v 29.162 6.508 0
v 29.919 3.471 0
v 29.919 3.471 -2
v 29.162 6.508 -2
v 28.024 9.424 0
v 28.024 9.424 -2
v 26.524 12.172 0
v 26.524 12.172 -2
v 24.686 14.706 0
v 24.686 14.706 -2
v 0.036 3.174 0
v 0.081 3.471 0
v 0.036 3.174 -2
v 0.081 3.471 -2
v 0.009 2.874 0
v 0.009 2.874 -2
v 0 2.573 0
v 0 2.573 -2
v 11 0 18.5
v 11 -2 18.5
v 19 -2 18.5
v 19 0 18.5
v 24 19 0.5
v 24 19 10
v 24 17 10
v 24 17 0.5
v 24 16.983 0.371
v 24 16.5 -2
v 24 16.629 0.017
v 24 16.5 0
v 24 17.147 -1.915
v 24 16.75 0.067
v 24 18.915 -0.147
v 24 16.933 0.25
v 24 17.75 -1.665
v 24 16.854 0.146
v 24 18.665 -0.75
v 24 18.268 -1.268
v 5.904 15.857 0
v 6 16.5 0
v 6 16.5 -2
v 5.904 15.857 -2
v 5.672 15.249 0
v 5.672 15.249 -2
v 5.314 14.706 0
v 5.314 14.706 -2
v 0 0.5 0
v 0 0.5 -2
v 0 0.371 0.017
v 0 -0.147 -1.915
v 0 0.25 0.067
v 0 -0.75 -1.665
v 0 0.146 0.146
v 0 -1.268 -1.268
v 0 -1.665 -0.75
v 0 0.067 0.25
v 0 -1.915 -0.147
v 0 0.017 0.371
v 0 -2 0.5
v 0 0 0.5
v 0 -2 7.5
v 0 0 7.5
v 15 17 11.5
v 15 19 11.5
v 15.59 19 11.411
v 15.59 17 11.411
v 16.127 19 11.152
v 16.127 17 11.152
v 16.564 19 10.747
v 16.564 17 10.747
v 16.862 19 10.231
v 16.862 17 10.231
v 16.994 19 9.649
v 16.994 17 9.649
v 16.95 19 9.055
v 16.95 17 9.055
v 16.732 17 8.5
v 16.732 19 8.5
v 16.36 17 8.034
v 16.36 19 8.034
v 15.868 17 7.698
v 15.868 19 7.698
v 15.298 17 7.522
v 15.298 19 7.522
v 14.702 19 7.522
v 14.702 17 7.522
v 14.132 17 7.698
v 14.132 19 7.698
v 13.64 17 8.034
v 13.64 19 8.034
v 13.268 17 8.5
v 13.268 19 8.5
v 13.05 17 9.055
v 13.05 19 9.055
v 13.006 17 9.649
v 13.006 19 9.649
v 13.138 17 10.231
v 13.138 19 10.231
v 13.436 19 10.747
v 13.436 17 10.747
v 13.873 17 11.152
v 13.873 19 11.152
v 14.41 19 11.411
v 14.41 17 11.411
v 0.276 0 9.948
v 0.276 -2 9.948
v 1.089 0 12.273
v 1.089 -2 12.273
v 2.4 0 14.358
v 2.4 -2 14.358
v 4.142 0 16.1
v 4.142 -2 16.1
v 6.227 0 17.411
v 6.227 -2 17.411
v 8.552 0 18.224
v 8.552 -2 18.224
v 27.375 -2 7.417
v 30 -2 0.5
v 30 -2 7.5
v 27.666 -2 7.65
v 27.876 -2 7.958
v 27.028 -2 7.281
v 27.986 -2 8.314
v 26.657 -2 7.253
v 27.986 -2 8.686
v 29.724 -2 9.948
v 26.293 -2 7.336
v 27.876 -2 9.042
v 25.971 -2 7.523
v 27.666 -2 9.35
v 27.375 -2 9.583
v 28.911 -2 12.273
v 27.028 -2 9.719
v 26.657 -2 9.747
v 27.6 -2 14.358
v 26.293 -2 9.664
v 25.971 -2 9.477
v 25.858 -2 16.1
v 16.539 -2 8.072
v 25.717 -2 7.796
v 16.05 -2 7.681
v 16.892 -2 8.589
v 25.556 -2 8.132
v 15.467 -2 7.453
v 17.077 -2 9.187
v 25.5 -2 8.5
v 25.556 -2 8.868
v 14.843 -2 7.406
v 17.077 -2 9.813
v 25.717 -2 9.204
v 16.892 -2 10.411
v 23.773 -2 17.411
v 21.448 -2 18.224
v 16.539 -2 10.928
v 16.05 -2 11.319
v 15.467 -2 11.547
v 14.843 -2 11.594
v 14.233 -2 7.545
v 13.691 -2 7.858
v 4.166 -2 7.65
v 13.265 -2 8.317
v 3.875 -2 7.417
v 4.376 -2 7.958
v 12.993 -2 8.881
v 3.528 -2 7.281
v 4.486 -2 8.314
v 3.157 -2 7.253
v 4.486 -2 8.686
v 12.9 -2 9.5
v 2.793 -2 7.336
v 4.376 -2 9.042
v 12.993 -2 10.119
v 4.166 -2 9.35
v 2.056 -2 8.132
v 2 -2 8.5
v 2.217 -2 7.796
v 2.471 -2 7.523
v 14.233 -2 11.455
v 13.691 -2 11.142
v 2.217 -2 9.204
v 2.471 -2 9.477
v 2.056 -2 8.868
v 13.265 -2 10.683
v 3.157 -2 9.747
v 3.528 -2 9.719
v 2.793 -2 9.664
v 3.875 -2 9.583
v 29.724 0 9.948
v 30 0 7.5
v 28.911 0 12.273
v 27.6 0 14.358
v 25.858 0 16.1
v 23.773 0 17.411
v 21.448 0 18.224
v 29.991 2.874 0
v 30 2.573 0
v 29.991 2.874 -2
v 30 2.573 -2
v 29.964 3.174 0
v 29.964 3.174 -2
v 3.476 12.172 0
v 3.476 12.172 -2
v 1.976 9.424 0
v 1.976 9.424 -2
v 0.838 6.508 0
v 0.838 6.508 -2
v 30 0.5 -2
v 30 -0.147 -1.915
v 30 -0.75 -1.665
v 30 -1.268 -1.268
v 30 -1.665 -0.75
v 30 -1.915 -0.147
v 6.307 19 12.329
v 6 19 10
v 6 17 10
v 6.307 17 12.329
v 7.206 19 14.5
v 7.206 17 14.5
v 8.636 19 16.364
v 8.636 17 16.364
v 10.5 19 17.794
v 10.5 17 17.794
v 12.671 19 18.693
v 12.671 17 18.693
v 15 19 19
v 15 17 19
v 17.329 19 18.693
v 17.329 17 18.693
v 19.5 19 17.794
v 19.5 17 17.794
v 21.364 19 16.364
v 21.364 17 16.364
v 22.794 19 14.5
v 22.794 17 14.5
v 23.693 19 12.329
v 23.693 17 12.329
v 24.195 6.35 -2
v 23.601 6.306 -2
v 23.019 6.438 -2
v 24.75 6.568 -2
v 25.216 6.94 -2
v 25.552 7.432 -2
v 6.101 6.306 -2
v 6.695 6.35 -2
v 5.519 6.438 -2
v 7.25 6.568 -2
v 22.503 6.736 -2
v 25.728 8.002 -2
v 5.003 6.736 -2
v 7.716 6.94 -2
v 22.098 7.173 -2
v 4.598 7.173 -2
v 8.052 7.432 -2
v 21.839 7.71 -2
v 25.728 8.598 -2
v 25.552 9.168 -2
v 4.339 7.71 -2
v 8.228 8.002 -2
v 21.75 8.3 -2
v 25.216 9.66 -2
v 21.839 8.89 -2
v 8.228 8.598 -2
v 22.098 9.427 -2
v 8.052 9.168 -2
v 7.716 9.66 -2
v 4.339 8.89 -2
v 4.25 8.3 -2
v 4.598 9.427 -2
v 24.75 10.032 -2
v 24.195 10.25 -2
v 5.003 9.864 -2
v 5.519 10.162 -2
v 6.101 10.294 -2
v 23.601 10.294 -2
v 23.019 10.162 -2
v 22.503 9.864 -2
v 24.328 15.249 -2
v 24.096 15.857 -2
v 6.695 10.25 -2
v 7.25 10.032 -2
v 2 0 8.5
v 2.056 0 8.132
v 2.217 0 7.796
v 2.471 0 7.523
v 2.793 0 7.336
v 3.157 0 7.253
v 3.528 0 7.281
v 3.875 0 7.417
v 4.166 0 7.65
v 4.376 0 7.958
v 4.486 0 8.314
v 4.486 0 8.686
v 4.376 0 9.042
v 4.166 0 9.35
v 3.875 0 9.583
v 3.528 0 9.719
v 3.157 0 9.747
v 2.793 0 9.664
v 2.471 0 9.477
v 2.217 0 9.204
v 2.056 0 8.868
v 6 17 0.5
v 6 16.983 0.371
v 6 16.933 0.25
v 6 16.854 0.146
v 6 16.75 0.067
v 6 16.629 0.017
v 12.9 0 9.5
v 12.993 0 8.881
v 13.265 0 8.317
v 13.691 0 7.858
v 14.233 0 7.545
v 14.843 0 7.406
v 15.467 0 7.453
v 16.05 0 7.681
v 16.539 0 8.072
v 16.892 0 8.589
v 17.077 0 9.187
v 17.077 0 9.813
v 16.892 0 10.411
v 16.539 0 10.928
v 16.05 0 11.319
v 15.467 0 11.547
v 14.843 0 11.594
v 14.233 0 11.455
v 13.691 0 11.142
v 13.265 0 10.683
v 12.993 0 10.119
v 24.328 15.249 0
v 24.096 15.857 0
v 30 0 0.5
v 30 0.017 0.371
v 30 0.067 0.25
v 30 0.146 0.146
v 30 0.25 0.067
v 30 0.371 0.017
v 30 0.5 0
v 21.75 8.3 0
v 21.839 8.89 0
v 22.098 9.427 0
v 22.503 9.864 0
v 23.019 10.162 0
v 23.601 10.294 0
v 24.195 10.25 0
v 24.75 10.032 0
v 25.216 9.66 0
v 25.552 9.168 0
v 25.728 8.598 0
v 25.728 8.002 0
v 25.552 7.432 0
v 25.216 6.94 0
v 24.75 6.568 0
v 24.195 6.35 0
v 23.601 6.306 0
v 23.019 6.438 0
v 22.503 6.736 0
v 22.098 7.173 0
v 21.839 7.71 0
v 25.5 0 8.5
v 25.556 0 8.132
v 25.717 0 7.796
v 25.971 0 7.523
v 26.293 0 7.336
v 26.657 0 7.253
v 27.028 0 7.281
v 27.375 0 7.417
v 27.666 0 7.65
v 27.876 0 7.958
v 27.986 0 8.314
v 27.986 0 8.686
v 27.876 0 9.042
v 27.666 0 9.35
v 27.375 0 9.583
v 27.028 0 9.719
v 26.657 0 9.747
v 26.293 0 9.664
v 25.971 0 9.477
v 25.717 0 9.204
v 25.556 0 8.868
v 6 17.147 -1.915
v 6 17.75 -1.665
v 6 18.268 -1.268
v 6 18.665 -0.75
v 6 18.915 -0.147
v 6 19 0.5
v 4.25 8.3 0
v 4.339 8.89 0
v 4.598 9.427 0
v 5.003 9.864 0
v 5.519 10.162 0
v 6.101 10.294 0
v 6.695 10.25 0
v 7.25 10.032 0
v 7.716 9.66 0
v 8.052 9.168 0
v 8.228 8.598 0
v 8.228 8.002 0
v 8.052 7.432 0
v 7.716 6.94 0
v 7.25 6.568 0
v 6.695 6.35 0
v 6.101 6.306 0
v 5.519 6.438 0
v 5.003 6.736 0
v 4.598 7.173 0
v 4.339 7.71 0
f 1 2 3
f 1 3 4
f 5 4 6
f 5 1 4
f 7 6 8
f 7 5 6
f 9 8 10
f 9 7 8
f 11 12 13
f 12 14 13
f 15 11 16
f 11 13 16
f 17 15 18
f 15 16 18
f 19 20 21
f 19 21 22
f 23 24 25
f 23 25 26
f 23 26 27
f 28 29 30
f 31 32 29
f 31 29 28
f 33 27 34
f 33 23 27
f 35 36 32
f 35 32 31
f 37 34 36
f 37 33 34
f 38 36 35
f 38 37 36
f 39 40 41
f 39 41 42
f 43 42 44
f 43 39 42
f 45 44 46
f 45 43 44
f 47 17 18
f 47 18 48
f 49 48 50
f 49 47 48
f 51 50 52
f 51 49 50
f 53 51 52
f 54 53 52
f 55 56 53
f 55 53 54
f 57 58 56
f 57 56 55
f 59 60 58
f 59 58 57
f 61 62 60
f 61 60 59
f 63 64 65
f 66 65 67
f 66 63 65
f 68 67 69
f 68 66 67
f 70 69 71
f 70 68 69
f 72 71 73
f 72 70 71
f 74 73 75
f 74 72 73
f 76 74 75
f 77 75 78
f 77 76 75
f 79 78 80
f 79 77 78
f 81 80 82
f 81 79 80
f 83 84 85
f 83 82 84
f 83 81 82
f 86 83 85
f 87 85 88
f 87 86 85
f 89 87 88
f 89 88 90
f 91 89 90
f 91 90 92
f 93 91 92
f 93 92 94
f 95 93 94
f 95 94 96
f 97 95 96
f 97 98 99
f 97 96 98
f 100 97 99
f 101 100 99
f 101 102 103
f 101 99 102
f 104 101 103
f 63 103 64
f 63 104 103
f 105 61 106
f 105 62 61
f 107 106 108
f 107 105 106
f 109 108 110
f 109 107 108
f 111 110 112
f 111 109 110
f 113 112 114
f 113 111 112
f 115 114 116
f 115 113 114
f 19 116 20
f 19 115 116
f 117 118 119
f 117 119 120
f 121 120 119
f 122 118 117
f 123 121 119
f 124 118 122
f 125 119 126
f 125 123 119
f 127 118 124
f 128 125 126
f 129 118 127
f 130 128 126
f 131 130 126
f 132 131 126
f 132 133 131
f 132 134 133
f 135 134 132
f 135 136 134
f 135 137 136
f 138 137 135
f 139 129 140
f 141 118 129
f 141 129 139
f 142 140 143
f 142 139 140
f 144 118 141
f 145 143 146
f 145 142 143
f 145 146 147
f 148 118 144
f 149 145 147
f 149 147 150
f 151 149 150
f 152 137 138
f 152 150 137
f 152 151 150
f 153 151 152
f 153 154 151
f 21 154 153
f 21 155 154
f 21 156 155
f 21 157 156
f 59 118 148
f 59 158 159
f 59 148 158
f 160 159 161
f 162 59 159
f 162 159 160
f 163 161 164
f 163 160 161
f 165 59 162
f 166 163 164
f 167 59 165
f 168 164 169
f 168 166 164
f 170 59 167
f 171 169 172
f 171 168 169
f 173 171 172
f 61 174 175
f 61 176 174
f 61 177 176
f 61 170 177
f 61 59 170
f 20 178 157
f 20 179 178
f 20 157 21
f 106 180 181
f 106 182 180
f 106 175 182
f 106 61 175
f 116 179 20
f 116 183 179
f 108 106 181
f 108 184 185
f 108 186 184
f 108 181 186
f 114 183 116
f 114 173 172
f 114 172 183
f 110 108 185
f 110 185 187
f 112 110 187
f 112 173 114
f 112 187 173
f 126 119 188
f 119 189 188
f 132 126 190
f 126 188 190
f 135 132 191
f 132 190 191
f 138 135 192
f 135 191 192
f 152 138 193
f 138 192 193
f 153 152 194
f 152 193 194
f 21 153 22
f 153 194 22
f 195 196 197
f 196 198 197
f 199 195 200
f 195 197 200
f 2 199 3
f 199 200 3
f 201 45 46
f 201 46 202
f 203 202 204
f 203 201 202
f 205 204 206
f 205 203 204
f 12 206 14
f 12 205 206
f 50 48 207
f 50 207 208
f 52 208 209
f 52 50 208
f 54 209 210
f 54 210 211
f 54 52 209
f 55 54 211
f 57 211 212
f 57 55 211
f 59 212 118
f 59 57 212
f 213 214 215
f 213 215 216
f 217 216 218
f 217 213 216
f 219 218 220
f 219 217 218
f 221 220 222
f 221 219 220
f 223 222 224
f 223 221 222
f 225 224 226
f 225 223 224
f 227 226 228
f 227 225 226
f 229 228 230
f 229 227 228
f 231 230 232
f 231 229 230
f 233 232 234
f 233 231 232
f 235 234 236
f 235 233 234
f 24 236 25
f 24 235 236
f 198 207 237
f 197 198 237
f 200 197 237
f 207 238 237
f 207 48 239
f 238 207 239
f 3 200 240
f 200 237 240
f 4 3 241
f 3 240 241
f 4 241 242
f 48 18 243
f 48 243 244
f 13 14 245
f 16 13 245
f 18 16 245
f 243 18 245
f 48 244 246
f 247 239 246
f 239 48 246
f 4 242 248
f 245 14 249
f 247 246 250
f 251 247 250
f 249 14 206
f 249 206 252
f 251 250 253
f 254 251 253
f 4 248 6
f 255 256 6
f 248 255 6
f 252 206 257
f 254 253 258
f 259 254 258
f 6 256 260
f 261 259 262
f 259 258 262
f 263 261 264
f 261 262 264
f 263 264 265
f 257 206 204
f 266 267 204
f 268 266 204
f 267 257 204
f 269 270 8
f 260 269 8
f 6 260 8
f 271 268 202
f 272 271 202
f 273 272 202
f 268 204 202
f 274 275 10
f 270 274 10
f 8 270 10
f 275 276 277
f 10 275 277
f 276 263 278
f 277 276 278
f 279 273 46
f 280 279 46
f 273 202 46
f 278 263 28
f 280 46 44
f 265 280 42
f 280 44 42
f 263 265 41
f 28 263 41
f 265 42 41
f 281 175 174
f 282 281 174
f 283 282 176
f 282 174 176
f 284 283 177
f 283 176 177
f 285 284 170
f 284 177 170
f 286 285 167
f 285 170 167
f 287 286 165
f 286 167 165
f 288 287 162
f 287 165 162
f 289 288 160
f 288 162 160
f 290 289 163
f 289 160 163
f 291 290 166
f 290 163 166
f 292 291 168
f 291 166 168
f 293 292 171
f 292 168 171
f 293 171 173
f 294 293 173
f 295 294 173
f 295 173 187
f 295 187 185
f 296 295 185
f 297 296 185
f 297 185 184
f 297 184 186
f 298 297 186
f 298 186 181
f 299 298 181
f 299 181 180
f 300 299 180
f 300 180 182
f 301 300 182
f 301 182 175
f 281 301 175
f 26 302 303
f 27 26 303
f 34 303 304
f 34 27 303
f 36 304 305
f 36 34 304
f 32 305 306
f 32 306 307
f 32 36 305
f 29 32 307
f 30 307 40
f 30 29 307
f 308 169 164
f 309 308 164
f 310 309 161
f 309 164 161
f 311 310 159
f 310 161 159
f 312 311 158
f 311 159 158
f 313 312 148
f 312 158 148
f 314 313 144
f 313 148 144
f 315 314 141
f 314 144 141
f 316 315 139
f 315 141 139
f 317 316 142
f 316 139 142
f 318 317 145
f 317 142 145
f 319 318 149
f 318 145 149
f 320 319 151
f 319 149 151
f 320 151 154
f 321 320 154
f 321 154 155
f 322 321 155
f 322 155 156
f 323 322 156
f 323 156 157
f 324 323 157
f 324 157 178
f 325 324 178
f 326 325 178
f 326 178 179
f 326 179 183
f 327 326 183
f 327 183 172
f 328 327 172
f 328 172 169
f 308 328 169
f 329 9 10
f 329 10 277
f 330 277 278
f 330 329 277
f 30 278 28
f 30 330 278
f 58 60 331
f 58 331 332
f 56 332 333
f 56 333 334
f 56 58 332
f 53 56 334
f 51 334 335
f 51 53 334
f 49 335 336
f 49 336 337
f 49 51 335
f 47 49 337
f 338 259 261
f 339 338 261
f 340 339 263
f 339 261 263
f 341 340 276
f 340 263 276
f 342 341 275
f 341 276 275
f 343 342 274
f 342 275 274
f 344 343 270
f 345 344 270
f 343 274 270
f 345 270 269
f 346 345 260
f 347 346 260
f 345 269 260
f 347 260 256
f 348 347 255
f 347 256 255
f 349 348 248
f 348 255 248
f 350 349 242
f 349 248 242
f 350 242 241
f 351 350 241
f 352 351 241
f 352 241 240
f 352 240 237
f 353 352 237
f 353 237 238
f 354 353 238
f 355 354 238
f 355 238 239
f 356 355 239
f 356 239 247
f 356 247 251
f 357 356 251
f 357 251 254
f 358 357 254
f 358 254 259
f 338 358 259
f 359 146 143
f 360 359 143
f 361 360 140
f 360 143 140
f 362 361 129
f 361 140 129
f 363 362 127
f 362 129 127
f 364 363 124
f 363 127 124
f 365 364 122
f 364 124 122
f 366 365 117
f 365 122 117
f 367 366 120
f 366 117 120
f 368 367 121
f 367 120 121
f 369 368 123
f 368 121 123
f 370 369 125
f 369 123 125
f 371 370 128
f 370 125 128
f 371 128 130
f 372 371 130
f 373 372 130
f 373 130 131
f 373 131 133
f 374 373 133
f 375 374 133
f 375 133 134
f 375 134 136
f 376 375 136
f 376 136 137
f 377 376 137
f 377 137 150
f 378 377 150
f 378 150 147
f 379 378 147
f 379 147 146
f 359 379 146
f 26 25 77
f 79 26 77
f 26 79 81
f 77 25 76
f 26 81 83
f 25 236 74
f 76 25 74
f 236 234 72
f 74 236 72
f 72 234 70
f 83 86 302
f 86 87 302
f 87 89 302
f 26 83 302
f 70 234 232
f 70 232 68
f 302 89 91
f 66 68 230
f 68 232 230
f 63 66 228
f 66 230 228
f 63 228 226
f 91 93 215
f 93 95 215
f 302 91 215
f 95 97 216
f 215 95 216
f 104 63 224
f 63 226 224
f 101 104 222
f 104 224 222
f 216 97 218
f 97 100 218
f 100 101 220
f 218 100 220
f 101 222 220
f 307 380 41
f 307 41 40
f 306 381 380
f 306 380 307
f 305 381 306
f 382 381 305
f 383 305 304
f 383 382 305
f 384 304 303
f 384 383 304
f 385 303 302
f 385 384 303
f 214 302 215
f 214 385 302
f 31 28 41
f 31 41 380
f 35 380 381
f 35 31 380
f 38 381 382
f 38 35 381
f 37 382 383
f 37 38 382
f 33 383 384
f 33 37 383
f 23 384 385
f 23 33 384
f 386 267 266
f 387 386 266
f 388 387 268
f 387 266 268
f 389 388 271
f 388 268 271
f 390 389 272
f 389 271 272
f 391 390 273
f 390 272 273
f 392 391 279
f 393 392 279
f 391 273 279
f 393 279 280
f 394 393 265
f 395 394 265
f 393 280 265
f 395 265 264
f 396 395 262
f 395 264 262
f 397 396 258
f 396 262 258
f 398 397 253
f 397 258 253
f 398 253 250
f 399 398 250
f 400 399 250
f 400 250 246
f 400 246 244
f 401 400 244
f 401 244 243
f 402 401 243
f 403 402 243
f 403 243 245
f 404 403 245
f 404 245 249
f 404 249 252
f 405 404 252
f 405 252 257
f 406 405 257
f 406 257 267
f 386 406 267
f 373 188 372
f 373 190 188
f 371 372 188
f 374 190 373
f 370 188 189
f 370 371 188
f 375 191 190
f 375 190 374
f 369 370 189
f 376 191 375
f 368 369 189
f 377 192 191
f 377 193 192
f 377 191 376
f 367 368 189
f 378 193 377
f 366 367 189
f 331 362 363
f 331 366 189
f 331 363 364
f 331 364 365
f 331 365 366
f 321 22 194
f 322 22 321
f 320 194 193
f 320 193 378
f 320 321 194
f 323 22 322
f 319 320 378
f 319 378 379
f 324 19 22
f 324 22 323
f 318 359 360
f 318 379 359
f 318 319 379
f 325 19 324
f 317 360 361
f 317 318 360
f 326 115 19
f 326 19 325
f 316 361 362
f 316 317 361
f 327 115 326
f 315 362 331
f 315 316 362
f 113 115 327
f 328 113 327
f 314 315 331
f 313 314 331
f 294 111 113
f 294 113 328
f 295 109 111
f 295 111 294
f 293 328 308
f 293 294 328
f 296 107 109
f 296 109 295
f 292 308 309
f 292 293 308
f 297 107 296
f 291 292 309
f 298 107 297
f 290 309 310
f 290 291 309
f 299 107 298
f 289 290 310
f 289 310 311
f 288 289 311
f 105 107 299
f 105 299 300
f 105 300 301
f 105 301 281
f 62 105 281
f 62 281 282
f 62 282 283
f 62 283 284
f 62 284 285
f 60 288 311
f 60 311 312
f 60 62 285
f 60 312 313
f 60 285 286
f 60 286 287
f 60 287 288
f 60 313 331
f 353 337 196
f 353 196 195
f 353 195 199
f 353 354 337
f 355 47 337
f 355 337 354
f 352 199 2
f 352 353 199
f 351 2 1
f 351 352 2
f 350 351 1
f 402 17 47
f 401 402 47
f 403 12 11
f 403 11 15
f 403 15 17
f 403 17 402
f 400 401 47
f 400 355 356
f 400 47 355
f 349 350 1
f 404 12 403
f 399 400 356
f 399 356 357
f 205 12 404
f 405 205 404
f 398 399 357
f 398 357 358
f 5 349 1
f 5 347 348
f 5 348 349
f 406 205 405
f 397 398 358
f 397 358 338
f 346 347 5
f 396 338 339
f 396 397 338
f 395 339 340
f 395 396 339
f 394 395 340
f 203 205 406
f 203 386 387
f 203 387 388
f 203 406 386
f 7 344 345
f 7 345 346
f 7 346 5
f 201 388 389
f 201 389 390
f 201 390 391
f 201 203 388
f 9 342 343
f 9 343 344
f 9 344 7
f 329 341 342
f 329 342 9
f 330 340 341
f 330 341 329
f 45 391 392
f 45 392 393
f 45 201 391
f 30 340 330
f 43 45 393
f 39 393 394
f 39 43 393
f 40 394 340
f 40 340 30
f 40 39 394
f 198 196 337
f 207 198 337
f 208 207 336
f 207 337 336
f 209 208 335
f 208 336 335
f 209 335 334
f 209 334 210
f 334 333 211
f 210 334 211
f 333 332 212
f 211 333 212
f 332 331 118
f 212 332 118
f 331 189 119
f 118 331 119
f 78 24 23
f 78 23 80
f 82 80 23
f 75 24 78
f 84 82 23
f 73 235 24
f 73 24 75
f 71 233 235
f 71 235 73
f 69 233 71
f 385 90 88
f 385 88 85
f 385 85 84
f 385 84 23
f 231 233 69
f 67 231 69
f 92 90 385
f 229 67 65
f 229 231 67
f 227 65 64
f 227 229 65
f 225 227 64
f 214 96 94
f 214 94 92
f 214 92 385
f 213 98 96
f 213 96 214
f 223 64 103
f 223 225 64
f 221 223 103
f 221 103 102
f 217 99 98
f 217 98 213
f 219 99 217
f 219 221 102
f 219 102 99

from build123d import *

# Parameters (mm, degrees)
BRIDA_BASE1_DEPTH                = 2
REDONDEO5MM_R                    = 5
REDONDEO3MM_R                    = 3
BRIDA_DE_ARISTA1_STRIP_W         = 9
BRIDA_DE_ARISTA1_STRIP_H         = 2
BRIDA_DE_ARISTA1_STRIP_CUT_DEPTH = 30
BRIDA_DE_ARISTA1_DEPTH           = 30
BRIDA_DE_ARISTA2_DEPTH           = 18
BRIDA_START                      = 2
BRIDA_DE_ARISTA2_FLAT_DEPTH      = 2
CORTAR_EXTRUIR6_REACH            = 43.255
CROQUIS26_R                      = 2
REDONDEO11MM_R                   = 11
TALADRO_ROSCADO_M32_D            = 2.5
TALADRO_ROSCADO_M32_DEPTH        = 20.65
TALADRO_ROSCADO_M32_TIP          = 0.751075774
TALADRO_ROSCADO_M52_D            = 4.2
TALADRO_ROSCADO_M52_DEPTH        = 2
CORTAR_EXTRUIR7_REACH            = 42.274
CROQUIS36_R                      = 2


# Sheet-metal steps are written as plain solids
with BuildPart() as part:
    # Croquis1 → Brida base1 (new body)
    with BuildSketch(Plane.XY):
        with BuildLine():
            Line((0, 0), (30, 0))
            Line((30, 0), (30, 3))
            ThreePointArc((30, 3), (27.901523057, 9.682731068), (24, 15.5))
            Line((24, 15.5), (24, 16.5))
            Line((24, 16.5), (6, 16.5))
            Line((6, 16.5), (6, 15.5))
            ThreePointArc((6, 15.5), (2.098476943, 9.682731068), (0, 3))
            Line((0, 3), (0, 0))
        make_face()
    extrude(amount=-BRIDA_BASE1_DEPTH)

    # Redondeo5mm
    redondeo5mm_edges = [part.edges().sort_by_distance(p)[0] for p in [
        (0, 3, -1),
        (30, 3, -1),
    ]]
    fillet(redondeo5mm_edges, radius=REDONDEO5MM_R)

    # Redondeo3mm
    # the kernel refuses this fillet: 3 mm, written as the material it adds along each edge
    with BuildSketch(Plane(origin=(24, 15.5, 0), x_dir=(0, 1, 0), z_dir=(0, 0, -1))) as redondeo3mm_piece_1:
        with BuildLine():
            CenterArc((1.118262022, 2.997668109), REDONDEO3MM_R, 230.394906527, 37.345869832)
            Line((-0.794215431, 0.686298387), (-0.83246498, 0.640070993))
            ThreePointArc((-0.83246498, 0.640070993), (-0.432666371, 0.301999114), (-0.040192089, -0.044548805))
            Line((-0.040192089, -0.044548805), (0, -0.06))
            ThreePointArc((0, -0.06), (0.5, -0.06), (0.99763476, -0.059953362))
            Line((0.99763476, -0.059953362), (1, 0))
        make_face()
    extrude(amount=2)
    with BuildSketch(Plane(origin=(6, 15.5, 0), x_dir=(-0.6538299662985165, -0.75664151034032, 0), z_dir=(0, 0, -1))) as redondeo3mm_piece_2:
        with BuildLine():
            CenterArc((1.113841774, 2.999313346), REDONDEO3MM_R, 231.428232408, 37.345869832)
            Line((-0.75664151, 0.653829966), (-0.794051176, 0.606920299))
            ThreePointArc((-0.794051176, 0.606920299), (-0.417550553, 0.281516493), (-0.039229798, -0.045398491))
            Line((-0.039229798, -0.045398491), (0.001283659, -0.059986267))
            ThreePointArc((0.001283659, -0.059986267), (0.524829407, -0.054385173), (1.048375155, -0.059986267))
            Line((1.048375155, -0.059986267), (1.049658814, 0))
        make_face()
    extrude(amount=2)

    # Brida de arista1 strip (across the edge) → Brida de arista1 strip cut (cut)
    with BuildSketch(Plane.YZ):
        with Locations((-4, -1)):
            Rectangle(BRIDA_DE_ARISTA1_STRIP_W, BRIDA_DE_ARISTA1_STRIP_H)
    extrude(amount=BRIDA_DE_ARISTA1_STRIP_CUT_DEPTH, mode=Mode.SUBTRACT)

    # Brida de arista1 section (across the edge) → Brida de arista1 (add)
    with BuildSketch(Plane.YZ):
        with BuildLine():
            Line((-2, 0.5), (-2, 18.5))
            Line((-2, 18.5), (0, 18.5))
            Line((0, 18.5), (0, 0.5))
            ThreePointArc((0, 0.5), (0.146446609, 0.146446609), (0.5, 0))
            Line((0.5, 0), (0.5, -2))
            ThreePointArc((0.5, -2), (-1.267766953, -1.267766953), (-2, 0.5))
        make_face()
    extrude(amount=BRIDA_DE_ARISTA1_DEPTH)

    # Brida de arista2 bend section (across the edge) → Brida de arista2 (add)
    with BuildSketch(Plane(origin=(24, 17, 0), x_dir=(0, -1, 0), z_dir=(-1, 0, 0))):
        with BuildLine():
            Line((-2, 0.5), (0, 0.5))
            ThreePointArc((0, 0.5), (0.146446609, 0.146446609), (0.5, 0))
            Line((0.5, 0), (0.5, -2))
            ThreePointArc((0.5, -2), (-1.267766953, -1.267766953), (-2, 0.5))
        make_face()
    extrude(amount=BRIDA_DE_ARISTA2_DEPTH)

    # Brida de arista2 profile (on flange) → Brida de arista2 flat (add)
    with BuildSketch(Plane(origin=(0, 17, 0), x_dir=(-1, 0, 0), z_dir=(0, 1, 0)).offset(BRIDA_START)):
        with BuildLine():
            ThreePointArc((-6, 10), (-15, 19), (-24, 10))
            Line((-24, 10), (-24, 0.5))
            Line((-24, 0.5), (-6, 0.5))
            Line((-6, 0.5), (-6, 10))
        make_face()
    extrude(amount=-BRIDA_DE_ARISTA2_FLAT_DEPTH)

    # Croquis26 → Cortar-Extruir6 (cut, up to next)
    with BuildSketch(Plane(origin=(0, 0, -2), x_dir=(-1, 0, 0), z_dir=(0, 0, -1)), mode=Mode.PRIVATE) as cortar_extruir6_sk1:
        with Locations((-6.25, 8.3)):
            Circle(CROQUIS26_R)
    cortar_extruir6_tool1 = extrude(cortar_extruir6_sk1.sketch, amount=-CORTAR_EXTRUIR6_REACH, mode=Mode.PRIVATE) & part.part
    # Croquis26 → Cortar-Extruir6 (cut, up to next)
    with BuildSketch(Plane(origin=(0, 0, -2), x_dir=(-1, 0, 0), z_dir=(0, 0, -1)), mode=Mode.PRIVATE) as cortar_extruir6_sk2:
        with Locations((-23.75, 8.3)):
            Circle(CROQUIS26_R)
    cortar_extruir6_tool2 = extrude(cortar_extruir6_sk2.sketch, amount=-CORTAR_EXTRUIR6_REACH, mode=Mode.PRIVATE) & part.part
    add(cortar_extruir6_tool1.solids().sort_by_distance((6.25, 8.3, -2))[0], mode=Mode.SUBTRACT)
    add(cortar_extruir6_tool2.solids().sort_by_distance((23.75, 8.3, -2))[0], mode=Mode.SUBTRACT)

    # Redondeo11mm
    redondeo11mm_edges = [part.edges().sort_by_distance(p)[0] for p in [
        (0, -1, 18.5),
        (30, -1, 18.5),
    ]]
    fillet(redondeo11mm_edges, radius=REDONDEO11MM_R)

    # Taladro roscado M32
    with Locations(Plane(origin=(0, 0, 0), x_dir=(1, 0, 0), z_dir=(0, 1, 0))):
        with Locations((3.25, -8.5), (26.75, -8.5)):
            Hole(TALADRO_ROSCADO_M32_D / 2, depth=TALADRO_ROSCADO_M32_DEPTH)
            with Locations((0, 0, -(TALADRO_ROSCADO_M32_DEPTH + TALADRO_ROSCADO_M32_TIP / 2))):  # 118° drill point
                Cone(0, TALADRO_ROSCADO_M32_D / 2, TALADRO_ROSCADO_M32_TIP, mode=Mode.SUBTRACT)

    # Taladro roscado M52
    with Locations(Plane(origin=(3.715500562, 0, 2.638137214), x_dir=(1, 0, 0), z_dir=(0, 1, 0))):
        with Locations((11.284499438, -6.861862786)):
            Hole(TALADRO_ROSCADO_M52_D / 2, depth=TALADRO_ROSCADO_M52_DEPTH)

    # Croquis36 → Cortar-Extruir7 (cut, up to next)
    with BuildSketch(Plane(origin=(0, 17, 0), x_dir=(1, 0, 0), z_dir=(0, 1, 0)), mode=Mode.PRIVATE) as cortar_extruir7_sk1:
        with Locations(Location((15, -9.5, 0), (0, 0, 270))):
            Circle(CROQUIS36_R)
    cortar_extruir7_tool1 = extrude(cortar_extruir7_sk1.sketch, amount=CORTAR_EXTRUIR7_REACH, mode=Mode.PRIVATE) & part.part
    add(cortar_extruir7_tool1.solids().sort_by_distance((15, 17, 9.5))[0], mode=Mode.SUBTRACT)


solid = part.part
